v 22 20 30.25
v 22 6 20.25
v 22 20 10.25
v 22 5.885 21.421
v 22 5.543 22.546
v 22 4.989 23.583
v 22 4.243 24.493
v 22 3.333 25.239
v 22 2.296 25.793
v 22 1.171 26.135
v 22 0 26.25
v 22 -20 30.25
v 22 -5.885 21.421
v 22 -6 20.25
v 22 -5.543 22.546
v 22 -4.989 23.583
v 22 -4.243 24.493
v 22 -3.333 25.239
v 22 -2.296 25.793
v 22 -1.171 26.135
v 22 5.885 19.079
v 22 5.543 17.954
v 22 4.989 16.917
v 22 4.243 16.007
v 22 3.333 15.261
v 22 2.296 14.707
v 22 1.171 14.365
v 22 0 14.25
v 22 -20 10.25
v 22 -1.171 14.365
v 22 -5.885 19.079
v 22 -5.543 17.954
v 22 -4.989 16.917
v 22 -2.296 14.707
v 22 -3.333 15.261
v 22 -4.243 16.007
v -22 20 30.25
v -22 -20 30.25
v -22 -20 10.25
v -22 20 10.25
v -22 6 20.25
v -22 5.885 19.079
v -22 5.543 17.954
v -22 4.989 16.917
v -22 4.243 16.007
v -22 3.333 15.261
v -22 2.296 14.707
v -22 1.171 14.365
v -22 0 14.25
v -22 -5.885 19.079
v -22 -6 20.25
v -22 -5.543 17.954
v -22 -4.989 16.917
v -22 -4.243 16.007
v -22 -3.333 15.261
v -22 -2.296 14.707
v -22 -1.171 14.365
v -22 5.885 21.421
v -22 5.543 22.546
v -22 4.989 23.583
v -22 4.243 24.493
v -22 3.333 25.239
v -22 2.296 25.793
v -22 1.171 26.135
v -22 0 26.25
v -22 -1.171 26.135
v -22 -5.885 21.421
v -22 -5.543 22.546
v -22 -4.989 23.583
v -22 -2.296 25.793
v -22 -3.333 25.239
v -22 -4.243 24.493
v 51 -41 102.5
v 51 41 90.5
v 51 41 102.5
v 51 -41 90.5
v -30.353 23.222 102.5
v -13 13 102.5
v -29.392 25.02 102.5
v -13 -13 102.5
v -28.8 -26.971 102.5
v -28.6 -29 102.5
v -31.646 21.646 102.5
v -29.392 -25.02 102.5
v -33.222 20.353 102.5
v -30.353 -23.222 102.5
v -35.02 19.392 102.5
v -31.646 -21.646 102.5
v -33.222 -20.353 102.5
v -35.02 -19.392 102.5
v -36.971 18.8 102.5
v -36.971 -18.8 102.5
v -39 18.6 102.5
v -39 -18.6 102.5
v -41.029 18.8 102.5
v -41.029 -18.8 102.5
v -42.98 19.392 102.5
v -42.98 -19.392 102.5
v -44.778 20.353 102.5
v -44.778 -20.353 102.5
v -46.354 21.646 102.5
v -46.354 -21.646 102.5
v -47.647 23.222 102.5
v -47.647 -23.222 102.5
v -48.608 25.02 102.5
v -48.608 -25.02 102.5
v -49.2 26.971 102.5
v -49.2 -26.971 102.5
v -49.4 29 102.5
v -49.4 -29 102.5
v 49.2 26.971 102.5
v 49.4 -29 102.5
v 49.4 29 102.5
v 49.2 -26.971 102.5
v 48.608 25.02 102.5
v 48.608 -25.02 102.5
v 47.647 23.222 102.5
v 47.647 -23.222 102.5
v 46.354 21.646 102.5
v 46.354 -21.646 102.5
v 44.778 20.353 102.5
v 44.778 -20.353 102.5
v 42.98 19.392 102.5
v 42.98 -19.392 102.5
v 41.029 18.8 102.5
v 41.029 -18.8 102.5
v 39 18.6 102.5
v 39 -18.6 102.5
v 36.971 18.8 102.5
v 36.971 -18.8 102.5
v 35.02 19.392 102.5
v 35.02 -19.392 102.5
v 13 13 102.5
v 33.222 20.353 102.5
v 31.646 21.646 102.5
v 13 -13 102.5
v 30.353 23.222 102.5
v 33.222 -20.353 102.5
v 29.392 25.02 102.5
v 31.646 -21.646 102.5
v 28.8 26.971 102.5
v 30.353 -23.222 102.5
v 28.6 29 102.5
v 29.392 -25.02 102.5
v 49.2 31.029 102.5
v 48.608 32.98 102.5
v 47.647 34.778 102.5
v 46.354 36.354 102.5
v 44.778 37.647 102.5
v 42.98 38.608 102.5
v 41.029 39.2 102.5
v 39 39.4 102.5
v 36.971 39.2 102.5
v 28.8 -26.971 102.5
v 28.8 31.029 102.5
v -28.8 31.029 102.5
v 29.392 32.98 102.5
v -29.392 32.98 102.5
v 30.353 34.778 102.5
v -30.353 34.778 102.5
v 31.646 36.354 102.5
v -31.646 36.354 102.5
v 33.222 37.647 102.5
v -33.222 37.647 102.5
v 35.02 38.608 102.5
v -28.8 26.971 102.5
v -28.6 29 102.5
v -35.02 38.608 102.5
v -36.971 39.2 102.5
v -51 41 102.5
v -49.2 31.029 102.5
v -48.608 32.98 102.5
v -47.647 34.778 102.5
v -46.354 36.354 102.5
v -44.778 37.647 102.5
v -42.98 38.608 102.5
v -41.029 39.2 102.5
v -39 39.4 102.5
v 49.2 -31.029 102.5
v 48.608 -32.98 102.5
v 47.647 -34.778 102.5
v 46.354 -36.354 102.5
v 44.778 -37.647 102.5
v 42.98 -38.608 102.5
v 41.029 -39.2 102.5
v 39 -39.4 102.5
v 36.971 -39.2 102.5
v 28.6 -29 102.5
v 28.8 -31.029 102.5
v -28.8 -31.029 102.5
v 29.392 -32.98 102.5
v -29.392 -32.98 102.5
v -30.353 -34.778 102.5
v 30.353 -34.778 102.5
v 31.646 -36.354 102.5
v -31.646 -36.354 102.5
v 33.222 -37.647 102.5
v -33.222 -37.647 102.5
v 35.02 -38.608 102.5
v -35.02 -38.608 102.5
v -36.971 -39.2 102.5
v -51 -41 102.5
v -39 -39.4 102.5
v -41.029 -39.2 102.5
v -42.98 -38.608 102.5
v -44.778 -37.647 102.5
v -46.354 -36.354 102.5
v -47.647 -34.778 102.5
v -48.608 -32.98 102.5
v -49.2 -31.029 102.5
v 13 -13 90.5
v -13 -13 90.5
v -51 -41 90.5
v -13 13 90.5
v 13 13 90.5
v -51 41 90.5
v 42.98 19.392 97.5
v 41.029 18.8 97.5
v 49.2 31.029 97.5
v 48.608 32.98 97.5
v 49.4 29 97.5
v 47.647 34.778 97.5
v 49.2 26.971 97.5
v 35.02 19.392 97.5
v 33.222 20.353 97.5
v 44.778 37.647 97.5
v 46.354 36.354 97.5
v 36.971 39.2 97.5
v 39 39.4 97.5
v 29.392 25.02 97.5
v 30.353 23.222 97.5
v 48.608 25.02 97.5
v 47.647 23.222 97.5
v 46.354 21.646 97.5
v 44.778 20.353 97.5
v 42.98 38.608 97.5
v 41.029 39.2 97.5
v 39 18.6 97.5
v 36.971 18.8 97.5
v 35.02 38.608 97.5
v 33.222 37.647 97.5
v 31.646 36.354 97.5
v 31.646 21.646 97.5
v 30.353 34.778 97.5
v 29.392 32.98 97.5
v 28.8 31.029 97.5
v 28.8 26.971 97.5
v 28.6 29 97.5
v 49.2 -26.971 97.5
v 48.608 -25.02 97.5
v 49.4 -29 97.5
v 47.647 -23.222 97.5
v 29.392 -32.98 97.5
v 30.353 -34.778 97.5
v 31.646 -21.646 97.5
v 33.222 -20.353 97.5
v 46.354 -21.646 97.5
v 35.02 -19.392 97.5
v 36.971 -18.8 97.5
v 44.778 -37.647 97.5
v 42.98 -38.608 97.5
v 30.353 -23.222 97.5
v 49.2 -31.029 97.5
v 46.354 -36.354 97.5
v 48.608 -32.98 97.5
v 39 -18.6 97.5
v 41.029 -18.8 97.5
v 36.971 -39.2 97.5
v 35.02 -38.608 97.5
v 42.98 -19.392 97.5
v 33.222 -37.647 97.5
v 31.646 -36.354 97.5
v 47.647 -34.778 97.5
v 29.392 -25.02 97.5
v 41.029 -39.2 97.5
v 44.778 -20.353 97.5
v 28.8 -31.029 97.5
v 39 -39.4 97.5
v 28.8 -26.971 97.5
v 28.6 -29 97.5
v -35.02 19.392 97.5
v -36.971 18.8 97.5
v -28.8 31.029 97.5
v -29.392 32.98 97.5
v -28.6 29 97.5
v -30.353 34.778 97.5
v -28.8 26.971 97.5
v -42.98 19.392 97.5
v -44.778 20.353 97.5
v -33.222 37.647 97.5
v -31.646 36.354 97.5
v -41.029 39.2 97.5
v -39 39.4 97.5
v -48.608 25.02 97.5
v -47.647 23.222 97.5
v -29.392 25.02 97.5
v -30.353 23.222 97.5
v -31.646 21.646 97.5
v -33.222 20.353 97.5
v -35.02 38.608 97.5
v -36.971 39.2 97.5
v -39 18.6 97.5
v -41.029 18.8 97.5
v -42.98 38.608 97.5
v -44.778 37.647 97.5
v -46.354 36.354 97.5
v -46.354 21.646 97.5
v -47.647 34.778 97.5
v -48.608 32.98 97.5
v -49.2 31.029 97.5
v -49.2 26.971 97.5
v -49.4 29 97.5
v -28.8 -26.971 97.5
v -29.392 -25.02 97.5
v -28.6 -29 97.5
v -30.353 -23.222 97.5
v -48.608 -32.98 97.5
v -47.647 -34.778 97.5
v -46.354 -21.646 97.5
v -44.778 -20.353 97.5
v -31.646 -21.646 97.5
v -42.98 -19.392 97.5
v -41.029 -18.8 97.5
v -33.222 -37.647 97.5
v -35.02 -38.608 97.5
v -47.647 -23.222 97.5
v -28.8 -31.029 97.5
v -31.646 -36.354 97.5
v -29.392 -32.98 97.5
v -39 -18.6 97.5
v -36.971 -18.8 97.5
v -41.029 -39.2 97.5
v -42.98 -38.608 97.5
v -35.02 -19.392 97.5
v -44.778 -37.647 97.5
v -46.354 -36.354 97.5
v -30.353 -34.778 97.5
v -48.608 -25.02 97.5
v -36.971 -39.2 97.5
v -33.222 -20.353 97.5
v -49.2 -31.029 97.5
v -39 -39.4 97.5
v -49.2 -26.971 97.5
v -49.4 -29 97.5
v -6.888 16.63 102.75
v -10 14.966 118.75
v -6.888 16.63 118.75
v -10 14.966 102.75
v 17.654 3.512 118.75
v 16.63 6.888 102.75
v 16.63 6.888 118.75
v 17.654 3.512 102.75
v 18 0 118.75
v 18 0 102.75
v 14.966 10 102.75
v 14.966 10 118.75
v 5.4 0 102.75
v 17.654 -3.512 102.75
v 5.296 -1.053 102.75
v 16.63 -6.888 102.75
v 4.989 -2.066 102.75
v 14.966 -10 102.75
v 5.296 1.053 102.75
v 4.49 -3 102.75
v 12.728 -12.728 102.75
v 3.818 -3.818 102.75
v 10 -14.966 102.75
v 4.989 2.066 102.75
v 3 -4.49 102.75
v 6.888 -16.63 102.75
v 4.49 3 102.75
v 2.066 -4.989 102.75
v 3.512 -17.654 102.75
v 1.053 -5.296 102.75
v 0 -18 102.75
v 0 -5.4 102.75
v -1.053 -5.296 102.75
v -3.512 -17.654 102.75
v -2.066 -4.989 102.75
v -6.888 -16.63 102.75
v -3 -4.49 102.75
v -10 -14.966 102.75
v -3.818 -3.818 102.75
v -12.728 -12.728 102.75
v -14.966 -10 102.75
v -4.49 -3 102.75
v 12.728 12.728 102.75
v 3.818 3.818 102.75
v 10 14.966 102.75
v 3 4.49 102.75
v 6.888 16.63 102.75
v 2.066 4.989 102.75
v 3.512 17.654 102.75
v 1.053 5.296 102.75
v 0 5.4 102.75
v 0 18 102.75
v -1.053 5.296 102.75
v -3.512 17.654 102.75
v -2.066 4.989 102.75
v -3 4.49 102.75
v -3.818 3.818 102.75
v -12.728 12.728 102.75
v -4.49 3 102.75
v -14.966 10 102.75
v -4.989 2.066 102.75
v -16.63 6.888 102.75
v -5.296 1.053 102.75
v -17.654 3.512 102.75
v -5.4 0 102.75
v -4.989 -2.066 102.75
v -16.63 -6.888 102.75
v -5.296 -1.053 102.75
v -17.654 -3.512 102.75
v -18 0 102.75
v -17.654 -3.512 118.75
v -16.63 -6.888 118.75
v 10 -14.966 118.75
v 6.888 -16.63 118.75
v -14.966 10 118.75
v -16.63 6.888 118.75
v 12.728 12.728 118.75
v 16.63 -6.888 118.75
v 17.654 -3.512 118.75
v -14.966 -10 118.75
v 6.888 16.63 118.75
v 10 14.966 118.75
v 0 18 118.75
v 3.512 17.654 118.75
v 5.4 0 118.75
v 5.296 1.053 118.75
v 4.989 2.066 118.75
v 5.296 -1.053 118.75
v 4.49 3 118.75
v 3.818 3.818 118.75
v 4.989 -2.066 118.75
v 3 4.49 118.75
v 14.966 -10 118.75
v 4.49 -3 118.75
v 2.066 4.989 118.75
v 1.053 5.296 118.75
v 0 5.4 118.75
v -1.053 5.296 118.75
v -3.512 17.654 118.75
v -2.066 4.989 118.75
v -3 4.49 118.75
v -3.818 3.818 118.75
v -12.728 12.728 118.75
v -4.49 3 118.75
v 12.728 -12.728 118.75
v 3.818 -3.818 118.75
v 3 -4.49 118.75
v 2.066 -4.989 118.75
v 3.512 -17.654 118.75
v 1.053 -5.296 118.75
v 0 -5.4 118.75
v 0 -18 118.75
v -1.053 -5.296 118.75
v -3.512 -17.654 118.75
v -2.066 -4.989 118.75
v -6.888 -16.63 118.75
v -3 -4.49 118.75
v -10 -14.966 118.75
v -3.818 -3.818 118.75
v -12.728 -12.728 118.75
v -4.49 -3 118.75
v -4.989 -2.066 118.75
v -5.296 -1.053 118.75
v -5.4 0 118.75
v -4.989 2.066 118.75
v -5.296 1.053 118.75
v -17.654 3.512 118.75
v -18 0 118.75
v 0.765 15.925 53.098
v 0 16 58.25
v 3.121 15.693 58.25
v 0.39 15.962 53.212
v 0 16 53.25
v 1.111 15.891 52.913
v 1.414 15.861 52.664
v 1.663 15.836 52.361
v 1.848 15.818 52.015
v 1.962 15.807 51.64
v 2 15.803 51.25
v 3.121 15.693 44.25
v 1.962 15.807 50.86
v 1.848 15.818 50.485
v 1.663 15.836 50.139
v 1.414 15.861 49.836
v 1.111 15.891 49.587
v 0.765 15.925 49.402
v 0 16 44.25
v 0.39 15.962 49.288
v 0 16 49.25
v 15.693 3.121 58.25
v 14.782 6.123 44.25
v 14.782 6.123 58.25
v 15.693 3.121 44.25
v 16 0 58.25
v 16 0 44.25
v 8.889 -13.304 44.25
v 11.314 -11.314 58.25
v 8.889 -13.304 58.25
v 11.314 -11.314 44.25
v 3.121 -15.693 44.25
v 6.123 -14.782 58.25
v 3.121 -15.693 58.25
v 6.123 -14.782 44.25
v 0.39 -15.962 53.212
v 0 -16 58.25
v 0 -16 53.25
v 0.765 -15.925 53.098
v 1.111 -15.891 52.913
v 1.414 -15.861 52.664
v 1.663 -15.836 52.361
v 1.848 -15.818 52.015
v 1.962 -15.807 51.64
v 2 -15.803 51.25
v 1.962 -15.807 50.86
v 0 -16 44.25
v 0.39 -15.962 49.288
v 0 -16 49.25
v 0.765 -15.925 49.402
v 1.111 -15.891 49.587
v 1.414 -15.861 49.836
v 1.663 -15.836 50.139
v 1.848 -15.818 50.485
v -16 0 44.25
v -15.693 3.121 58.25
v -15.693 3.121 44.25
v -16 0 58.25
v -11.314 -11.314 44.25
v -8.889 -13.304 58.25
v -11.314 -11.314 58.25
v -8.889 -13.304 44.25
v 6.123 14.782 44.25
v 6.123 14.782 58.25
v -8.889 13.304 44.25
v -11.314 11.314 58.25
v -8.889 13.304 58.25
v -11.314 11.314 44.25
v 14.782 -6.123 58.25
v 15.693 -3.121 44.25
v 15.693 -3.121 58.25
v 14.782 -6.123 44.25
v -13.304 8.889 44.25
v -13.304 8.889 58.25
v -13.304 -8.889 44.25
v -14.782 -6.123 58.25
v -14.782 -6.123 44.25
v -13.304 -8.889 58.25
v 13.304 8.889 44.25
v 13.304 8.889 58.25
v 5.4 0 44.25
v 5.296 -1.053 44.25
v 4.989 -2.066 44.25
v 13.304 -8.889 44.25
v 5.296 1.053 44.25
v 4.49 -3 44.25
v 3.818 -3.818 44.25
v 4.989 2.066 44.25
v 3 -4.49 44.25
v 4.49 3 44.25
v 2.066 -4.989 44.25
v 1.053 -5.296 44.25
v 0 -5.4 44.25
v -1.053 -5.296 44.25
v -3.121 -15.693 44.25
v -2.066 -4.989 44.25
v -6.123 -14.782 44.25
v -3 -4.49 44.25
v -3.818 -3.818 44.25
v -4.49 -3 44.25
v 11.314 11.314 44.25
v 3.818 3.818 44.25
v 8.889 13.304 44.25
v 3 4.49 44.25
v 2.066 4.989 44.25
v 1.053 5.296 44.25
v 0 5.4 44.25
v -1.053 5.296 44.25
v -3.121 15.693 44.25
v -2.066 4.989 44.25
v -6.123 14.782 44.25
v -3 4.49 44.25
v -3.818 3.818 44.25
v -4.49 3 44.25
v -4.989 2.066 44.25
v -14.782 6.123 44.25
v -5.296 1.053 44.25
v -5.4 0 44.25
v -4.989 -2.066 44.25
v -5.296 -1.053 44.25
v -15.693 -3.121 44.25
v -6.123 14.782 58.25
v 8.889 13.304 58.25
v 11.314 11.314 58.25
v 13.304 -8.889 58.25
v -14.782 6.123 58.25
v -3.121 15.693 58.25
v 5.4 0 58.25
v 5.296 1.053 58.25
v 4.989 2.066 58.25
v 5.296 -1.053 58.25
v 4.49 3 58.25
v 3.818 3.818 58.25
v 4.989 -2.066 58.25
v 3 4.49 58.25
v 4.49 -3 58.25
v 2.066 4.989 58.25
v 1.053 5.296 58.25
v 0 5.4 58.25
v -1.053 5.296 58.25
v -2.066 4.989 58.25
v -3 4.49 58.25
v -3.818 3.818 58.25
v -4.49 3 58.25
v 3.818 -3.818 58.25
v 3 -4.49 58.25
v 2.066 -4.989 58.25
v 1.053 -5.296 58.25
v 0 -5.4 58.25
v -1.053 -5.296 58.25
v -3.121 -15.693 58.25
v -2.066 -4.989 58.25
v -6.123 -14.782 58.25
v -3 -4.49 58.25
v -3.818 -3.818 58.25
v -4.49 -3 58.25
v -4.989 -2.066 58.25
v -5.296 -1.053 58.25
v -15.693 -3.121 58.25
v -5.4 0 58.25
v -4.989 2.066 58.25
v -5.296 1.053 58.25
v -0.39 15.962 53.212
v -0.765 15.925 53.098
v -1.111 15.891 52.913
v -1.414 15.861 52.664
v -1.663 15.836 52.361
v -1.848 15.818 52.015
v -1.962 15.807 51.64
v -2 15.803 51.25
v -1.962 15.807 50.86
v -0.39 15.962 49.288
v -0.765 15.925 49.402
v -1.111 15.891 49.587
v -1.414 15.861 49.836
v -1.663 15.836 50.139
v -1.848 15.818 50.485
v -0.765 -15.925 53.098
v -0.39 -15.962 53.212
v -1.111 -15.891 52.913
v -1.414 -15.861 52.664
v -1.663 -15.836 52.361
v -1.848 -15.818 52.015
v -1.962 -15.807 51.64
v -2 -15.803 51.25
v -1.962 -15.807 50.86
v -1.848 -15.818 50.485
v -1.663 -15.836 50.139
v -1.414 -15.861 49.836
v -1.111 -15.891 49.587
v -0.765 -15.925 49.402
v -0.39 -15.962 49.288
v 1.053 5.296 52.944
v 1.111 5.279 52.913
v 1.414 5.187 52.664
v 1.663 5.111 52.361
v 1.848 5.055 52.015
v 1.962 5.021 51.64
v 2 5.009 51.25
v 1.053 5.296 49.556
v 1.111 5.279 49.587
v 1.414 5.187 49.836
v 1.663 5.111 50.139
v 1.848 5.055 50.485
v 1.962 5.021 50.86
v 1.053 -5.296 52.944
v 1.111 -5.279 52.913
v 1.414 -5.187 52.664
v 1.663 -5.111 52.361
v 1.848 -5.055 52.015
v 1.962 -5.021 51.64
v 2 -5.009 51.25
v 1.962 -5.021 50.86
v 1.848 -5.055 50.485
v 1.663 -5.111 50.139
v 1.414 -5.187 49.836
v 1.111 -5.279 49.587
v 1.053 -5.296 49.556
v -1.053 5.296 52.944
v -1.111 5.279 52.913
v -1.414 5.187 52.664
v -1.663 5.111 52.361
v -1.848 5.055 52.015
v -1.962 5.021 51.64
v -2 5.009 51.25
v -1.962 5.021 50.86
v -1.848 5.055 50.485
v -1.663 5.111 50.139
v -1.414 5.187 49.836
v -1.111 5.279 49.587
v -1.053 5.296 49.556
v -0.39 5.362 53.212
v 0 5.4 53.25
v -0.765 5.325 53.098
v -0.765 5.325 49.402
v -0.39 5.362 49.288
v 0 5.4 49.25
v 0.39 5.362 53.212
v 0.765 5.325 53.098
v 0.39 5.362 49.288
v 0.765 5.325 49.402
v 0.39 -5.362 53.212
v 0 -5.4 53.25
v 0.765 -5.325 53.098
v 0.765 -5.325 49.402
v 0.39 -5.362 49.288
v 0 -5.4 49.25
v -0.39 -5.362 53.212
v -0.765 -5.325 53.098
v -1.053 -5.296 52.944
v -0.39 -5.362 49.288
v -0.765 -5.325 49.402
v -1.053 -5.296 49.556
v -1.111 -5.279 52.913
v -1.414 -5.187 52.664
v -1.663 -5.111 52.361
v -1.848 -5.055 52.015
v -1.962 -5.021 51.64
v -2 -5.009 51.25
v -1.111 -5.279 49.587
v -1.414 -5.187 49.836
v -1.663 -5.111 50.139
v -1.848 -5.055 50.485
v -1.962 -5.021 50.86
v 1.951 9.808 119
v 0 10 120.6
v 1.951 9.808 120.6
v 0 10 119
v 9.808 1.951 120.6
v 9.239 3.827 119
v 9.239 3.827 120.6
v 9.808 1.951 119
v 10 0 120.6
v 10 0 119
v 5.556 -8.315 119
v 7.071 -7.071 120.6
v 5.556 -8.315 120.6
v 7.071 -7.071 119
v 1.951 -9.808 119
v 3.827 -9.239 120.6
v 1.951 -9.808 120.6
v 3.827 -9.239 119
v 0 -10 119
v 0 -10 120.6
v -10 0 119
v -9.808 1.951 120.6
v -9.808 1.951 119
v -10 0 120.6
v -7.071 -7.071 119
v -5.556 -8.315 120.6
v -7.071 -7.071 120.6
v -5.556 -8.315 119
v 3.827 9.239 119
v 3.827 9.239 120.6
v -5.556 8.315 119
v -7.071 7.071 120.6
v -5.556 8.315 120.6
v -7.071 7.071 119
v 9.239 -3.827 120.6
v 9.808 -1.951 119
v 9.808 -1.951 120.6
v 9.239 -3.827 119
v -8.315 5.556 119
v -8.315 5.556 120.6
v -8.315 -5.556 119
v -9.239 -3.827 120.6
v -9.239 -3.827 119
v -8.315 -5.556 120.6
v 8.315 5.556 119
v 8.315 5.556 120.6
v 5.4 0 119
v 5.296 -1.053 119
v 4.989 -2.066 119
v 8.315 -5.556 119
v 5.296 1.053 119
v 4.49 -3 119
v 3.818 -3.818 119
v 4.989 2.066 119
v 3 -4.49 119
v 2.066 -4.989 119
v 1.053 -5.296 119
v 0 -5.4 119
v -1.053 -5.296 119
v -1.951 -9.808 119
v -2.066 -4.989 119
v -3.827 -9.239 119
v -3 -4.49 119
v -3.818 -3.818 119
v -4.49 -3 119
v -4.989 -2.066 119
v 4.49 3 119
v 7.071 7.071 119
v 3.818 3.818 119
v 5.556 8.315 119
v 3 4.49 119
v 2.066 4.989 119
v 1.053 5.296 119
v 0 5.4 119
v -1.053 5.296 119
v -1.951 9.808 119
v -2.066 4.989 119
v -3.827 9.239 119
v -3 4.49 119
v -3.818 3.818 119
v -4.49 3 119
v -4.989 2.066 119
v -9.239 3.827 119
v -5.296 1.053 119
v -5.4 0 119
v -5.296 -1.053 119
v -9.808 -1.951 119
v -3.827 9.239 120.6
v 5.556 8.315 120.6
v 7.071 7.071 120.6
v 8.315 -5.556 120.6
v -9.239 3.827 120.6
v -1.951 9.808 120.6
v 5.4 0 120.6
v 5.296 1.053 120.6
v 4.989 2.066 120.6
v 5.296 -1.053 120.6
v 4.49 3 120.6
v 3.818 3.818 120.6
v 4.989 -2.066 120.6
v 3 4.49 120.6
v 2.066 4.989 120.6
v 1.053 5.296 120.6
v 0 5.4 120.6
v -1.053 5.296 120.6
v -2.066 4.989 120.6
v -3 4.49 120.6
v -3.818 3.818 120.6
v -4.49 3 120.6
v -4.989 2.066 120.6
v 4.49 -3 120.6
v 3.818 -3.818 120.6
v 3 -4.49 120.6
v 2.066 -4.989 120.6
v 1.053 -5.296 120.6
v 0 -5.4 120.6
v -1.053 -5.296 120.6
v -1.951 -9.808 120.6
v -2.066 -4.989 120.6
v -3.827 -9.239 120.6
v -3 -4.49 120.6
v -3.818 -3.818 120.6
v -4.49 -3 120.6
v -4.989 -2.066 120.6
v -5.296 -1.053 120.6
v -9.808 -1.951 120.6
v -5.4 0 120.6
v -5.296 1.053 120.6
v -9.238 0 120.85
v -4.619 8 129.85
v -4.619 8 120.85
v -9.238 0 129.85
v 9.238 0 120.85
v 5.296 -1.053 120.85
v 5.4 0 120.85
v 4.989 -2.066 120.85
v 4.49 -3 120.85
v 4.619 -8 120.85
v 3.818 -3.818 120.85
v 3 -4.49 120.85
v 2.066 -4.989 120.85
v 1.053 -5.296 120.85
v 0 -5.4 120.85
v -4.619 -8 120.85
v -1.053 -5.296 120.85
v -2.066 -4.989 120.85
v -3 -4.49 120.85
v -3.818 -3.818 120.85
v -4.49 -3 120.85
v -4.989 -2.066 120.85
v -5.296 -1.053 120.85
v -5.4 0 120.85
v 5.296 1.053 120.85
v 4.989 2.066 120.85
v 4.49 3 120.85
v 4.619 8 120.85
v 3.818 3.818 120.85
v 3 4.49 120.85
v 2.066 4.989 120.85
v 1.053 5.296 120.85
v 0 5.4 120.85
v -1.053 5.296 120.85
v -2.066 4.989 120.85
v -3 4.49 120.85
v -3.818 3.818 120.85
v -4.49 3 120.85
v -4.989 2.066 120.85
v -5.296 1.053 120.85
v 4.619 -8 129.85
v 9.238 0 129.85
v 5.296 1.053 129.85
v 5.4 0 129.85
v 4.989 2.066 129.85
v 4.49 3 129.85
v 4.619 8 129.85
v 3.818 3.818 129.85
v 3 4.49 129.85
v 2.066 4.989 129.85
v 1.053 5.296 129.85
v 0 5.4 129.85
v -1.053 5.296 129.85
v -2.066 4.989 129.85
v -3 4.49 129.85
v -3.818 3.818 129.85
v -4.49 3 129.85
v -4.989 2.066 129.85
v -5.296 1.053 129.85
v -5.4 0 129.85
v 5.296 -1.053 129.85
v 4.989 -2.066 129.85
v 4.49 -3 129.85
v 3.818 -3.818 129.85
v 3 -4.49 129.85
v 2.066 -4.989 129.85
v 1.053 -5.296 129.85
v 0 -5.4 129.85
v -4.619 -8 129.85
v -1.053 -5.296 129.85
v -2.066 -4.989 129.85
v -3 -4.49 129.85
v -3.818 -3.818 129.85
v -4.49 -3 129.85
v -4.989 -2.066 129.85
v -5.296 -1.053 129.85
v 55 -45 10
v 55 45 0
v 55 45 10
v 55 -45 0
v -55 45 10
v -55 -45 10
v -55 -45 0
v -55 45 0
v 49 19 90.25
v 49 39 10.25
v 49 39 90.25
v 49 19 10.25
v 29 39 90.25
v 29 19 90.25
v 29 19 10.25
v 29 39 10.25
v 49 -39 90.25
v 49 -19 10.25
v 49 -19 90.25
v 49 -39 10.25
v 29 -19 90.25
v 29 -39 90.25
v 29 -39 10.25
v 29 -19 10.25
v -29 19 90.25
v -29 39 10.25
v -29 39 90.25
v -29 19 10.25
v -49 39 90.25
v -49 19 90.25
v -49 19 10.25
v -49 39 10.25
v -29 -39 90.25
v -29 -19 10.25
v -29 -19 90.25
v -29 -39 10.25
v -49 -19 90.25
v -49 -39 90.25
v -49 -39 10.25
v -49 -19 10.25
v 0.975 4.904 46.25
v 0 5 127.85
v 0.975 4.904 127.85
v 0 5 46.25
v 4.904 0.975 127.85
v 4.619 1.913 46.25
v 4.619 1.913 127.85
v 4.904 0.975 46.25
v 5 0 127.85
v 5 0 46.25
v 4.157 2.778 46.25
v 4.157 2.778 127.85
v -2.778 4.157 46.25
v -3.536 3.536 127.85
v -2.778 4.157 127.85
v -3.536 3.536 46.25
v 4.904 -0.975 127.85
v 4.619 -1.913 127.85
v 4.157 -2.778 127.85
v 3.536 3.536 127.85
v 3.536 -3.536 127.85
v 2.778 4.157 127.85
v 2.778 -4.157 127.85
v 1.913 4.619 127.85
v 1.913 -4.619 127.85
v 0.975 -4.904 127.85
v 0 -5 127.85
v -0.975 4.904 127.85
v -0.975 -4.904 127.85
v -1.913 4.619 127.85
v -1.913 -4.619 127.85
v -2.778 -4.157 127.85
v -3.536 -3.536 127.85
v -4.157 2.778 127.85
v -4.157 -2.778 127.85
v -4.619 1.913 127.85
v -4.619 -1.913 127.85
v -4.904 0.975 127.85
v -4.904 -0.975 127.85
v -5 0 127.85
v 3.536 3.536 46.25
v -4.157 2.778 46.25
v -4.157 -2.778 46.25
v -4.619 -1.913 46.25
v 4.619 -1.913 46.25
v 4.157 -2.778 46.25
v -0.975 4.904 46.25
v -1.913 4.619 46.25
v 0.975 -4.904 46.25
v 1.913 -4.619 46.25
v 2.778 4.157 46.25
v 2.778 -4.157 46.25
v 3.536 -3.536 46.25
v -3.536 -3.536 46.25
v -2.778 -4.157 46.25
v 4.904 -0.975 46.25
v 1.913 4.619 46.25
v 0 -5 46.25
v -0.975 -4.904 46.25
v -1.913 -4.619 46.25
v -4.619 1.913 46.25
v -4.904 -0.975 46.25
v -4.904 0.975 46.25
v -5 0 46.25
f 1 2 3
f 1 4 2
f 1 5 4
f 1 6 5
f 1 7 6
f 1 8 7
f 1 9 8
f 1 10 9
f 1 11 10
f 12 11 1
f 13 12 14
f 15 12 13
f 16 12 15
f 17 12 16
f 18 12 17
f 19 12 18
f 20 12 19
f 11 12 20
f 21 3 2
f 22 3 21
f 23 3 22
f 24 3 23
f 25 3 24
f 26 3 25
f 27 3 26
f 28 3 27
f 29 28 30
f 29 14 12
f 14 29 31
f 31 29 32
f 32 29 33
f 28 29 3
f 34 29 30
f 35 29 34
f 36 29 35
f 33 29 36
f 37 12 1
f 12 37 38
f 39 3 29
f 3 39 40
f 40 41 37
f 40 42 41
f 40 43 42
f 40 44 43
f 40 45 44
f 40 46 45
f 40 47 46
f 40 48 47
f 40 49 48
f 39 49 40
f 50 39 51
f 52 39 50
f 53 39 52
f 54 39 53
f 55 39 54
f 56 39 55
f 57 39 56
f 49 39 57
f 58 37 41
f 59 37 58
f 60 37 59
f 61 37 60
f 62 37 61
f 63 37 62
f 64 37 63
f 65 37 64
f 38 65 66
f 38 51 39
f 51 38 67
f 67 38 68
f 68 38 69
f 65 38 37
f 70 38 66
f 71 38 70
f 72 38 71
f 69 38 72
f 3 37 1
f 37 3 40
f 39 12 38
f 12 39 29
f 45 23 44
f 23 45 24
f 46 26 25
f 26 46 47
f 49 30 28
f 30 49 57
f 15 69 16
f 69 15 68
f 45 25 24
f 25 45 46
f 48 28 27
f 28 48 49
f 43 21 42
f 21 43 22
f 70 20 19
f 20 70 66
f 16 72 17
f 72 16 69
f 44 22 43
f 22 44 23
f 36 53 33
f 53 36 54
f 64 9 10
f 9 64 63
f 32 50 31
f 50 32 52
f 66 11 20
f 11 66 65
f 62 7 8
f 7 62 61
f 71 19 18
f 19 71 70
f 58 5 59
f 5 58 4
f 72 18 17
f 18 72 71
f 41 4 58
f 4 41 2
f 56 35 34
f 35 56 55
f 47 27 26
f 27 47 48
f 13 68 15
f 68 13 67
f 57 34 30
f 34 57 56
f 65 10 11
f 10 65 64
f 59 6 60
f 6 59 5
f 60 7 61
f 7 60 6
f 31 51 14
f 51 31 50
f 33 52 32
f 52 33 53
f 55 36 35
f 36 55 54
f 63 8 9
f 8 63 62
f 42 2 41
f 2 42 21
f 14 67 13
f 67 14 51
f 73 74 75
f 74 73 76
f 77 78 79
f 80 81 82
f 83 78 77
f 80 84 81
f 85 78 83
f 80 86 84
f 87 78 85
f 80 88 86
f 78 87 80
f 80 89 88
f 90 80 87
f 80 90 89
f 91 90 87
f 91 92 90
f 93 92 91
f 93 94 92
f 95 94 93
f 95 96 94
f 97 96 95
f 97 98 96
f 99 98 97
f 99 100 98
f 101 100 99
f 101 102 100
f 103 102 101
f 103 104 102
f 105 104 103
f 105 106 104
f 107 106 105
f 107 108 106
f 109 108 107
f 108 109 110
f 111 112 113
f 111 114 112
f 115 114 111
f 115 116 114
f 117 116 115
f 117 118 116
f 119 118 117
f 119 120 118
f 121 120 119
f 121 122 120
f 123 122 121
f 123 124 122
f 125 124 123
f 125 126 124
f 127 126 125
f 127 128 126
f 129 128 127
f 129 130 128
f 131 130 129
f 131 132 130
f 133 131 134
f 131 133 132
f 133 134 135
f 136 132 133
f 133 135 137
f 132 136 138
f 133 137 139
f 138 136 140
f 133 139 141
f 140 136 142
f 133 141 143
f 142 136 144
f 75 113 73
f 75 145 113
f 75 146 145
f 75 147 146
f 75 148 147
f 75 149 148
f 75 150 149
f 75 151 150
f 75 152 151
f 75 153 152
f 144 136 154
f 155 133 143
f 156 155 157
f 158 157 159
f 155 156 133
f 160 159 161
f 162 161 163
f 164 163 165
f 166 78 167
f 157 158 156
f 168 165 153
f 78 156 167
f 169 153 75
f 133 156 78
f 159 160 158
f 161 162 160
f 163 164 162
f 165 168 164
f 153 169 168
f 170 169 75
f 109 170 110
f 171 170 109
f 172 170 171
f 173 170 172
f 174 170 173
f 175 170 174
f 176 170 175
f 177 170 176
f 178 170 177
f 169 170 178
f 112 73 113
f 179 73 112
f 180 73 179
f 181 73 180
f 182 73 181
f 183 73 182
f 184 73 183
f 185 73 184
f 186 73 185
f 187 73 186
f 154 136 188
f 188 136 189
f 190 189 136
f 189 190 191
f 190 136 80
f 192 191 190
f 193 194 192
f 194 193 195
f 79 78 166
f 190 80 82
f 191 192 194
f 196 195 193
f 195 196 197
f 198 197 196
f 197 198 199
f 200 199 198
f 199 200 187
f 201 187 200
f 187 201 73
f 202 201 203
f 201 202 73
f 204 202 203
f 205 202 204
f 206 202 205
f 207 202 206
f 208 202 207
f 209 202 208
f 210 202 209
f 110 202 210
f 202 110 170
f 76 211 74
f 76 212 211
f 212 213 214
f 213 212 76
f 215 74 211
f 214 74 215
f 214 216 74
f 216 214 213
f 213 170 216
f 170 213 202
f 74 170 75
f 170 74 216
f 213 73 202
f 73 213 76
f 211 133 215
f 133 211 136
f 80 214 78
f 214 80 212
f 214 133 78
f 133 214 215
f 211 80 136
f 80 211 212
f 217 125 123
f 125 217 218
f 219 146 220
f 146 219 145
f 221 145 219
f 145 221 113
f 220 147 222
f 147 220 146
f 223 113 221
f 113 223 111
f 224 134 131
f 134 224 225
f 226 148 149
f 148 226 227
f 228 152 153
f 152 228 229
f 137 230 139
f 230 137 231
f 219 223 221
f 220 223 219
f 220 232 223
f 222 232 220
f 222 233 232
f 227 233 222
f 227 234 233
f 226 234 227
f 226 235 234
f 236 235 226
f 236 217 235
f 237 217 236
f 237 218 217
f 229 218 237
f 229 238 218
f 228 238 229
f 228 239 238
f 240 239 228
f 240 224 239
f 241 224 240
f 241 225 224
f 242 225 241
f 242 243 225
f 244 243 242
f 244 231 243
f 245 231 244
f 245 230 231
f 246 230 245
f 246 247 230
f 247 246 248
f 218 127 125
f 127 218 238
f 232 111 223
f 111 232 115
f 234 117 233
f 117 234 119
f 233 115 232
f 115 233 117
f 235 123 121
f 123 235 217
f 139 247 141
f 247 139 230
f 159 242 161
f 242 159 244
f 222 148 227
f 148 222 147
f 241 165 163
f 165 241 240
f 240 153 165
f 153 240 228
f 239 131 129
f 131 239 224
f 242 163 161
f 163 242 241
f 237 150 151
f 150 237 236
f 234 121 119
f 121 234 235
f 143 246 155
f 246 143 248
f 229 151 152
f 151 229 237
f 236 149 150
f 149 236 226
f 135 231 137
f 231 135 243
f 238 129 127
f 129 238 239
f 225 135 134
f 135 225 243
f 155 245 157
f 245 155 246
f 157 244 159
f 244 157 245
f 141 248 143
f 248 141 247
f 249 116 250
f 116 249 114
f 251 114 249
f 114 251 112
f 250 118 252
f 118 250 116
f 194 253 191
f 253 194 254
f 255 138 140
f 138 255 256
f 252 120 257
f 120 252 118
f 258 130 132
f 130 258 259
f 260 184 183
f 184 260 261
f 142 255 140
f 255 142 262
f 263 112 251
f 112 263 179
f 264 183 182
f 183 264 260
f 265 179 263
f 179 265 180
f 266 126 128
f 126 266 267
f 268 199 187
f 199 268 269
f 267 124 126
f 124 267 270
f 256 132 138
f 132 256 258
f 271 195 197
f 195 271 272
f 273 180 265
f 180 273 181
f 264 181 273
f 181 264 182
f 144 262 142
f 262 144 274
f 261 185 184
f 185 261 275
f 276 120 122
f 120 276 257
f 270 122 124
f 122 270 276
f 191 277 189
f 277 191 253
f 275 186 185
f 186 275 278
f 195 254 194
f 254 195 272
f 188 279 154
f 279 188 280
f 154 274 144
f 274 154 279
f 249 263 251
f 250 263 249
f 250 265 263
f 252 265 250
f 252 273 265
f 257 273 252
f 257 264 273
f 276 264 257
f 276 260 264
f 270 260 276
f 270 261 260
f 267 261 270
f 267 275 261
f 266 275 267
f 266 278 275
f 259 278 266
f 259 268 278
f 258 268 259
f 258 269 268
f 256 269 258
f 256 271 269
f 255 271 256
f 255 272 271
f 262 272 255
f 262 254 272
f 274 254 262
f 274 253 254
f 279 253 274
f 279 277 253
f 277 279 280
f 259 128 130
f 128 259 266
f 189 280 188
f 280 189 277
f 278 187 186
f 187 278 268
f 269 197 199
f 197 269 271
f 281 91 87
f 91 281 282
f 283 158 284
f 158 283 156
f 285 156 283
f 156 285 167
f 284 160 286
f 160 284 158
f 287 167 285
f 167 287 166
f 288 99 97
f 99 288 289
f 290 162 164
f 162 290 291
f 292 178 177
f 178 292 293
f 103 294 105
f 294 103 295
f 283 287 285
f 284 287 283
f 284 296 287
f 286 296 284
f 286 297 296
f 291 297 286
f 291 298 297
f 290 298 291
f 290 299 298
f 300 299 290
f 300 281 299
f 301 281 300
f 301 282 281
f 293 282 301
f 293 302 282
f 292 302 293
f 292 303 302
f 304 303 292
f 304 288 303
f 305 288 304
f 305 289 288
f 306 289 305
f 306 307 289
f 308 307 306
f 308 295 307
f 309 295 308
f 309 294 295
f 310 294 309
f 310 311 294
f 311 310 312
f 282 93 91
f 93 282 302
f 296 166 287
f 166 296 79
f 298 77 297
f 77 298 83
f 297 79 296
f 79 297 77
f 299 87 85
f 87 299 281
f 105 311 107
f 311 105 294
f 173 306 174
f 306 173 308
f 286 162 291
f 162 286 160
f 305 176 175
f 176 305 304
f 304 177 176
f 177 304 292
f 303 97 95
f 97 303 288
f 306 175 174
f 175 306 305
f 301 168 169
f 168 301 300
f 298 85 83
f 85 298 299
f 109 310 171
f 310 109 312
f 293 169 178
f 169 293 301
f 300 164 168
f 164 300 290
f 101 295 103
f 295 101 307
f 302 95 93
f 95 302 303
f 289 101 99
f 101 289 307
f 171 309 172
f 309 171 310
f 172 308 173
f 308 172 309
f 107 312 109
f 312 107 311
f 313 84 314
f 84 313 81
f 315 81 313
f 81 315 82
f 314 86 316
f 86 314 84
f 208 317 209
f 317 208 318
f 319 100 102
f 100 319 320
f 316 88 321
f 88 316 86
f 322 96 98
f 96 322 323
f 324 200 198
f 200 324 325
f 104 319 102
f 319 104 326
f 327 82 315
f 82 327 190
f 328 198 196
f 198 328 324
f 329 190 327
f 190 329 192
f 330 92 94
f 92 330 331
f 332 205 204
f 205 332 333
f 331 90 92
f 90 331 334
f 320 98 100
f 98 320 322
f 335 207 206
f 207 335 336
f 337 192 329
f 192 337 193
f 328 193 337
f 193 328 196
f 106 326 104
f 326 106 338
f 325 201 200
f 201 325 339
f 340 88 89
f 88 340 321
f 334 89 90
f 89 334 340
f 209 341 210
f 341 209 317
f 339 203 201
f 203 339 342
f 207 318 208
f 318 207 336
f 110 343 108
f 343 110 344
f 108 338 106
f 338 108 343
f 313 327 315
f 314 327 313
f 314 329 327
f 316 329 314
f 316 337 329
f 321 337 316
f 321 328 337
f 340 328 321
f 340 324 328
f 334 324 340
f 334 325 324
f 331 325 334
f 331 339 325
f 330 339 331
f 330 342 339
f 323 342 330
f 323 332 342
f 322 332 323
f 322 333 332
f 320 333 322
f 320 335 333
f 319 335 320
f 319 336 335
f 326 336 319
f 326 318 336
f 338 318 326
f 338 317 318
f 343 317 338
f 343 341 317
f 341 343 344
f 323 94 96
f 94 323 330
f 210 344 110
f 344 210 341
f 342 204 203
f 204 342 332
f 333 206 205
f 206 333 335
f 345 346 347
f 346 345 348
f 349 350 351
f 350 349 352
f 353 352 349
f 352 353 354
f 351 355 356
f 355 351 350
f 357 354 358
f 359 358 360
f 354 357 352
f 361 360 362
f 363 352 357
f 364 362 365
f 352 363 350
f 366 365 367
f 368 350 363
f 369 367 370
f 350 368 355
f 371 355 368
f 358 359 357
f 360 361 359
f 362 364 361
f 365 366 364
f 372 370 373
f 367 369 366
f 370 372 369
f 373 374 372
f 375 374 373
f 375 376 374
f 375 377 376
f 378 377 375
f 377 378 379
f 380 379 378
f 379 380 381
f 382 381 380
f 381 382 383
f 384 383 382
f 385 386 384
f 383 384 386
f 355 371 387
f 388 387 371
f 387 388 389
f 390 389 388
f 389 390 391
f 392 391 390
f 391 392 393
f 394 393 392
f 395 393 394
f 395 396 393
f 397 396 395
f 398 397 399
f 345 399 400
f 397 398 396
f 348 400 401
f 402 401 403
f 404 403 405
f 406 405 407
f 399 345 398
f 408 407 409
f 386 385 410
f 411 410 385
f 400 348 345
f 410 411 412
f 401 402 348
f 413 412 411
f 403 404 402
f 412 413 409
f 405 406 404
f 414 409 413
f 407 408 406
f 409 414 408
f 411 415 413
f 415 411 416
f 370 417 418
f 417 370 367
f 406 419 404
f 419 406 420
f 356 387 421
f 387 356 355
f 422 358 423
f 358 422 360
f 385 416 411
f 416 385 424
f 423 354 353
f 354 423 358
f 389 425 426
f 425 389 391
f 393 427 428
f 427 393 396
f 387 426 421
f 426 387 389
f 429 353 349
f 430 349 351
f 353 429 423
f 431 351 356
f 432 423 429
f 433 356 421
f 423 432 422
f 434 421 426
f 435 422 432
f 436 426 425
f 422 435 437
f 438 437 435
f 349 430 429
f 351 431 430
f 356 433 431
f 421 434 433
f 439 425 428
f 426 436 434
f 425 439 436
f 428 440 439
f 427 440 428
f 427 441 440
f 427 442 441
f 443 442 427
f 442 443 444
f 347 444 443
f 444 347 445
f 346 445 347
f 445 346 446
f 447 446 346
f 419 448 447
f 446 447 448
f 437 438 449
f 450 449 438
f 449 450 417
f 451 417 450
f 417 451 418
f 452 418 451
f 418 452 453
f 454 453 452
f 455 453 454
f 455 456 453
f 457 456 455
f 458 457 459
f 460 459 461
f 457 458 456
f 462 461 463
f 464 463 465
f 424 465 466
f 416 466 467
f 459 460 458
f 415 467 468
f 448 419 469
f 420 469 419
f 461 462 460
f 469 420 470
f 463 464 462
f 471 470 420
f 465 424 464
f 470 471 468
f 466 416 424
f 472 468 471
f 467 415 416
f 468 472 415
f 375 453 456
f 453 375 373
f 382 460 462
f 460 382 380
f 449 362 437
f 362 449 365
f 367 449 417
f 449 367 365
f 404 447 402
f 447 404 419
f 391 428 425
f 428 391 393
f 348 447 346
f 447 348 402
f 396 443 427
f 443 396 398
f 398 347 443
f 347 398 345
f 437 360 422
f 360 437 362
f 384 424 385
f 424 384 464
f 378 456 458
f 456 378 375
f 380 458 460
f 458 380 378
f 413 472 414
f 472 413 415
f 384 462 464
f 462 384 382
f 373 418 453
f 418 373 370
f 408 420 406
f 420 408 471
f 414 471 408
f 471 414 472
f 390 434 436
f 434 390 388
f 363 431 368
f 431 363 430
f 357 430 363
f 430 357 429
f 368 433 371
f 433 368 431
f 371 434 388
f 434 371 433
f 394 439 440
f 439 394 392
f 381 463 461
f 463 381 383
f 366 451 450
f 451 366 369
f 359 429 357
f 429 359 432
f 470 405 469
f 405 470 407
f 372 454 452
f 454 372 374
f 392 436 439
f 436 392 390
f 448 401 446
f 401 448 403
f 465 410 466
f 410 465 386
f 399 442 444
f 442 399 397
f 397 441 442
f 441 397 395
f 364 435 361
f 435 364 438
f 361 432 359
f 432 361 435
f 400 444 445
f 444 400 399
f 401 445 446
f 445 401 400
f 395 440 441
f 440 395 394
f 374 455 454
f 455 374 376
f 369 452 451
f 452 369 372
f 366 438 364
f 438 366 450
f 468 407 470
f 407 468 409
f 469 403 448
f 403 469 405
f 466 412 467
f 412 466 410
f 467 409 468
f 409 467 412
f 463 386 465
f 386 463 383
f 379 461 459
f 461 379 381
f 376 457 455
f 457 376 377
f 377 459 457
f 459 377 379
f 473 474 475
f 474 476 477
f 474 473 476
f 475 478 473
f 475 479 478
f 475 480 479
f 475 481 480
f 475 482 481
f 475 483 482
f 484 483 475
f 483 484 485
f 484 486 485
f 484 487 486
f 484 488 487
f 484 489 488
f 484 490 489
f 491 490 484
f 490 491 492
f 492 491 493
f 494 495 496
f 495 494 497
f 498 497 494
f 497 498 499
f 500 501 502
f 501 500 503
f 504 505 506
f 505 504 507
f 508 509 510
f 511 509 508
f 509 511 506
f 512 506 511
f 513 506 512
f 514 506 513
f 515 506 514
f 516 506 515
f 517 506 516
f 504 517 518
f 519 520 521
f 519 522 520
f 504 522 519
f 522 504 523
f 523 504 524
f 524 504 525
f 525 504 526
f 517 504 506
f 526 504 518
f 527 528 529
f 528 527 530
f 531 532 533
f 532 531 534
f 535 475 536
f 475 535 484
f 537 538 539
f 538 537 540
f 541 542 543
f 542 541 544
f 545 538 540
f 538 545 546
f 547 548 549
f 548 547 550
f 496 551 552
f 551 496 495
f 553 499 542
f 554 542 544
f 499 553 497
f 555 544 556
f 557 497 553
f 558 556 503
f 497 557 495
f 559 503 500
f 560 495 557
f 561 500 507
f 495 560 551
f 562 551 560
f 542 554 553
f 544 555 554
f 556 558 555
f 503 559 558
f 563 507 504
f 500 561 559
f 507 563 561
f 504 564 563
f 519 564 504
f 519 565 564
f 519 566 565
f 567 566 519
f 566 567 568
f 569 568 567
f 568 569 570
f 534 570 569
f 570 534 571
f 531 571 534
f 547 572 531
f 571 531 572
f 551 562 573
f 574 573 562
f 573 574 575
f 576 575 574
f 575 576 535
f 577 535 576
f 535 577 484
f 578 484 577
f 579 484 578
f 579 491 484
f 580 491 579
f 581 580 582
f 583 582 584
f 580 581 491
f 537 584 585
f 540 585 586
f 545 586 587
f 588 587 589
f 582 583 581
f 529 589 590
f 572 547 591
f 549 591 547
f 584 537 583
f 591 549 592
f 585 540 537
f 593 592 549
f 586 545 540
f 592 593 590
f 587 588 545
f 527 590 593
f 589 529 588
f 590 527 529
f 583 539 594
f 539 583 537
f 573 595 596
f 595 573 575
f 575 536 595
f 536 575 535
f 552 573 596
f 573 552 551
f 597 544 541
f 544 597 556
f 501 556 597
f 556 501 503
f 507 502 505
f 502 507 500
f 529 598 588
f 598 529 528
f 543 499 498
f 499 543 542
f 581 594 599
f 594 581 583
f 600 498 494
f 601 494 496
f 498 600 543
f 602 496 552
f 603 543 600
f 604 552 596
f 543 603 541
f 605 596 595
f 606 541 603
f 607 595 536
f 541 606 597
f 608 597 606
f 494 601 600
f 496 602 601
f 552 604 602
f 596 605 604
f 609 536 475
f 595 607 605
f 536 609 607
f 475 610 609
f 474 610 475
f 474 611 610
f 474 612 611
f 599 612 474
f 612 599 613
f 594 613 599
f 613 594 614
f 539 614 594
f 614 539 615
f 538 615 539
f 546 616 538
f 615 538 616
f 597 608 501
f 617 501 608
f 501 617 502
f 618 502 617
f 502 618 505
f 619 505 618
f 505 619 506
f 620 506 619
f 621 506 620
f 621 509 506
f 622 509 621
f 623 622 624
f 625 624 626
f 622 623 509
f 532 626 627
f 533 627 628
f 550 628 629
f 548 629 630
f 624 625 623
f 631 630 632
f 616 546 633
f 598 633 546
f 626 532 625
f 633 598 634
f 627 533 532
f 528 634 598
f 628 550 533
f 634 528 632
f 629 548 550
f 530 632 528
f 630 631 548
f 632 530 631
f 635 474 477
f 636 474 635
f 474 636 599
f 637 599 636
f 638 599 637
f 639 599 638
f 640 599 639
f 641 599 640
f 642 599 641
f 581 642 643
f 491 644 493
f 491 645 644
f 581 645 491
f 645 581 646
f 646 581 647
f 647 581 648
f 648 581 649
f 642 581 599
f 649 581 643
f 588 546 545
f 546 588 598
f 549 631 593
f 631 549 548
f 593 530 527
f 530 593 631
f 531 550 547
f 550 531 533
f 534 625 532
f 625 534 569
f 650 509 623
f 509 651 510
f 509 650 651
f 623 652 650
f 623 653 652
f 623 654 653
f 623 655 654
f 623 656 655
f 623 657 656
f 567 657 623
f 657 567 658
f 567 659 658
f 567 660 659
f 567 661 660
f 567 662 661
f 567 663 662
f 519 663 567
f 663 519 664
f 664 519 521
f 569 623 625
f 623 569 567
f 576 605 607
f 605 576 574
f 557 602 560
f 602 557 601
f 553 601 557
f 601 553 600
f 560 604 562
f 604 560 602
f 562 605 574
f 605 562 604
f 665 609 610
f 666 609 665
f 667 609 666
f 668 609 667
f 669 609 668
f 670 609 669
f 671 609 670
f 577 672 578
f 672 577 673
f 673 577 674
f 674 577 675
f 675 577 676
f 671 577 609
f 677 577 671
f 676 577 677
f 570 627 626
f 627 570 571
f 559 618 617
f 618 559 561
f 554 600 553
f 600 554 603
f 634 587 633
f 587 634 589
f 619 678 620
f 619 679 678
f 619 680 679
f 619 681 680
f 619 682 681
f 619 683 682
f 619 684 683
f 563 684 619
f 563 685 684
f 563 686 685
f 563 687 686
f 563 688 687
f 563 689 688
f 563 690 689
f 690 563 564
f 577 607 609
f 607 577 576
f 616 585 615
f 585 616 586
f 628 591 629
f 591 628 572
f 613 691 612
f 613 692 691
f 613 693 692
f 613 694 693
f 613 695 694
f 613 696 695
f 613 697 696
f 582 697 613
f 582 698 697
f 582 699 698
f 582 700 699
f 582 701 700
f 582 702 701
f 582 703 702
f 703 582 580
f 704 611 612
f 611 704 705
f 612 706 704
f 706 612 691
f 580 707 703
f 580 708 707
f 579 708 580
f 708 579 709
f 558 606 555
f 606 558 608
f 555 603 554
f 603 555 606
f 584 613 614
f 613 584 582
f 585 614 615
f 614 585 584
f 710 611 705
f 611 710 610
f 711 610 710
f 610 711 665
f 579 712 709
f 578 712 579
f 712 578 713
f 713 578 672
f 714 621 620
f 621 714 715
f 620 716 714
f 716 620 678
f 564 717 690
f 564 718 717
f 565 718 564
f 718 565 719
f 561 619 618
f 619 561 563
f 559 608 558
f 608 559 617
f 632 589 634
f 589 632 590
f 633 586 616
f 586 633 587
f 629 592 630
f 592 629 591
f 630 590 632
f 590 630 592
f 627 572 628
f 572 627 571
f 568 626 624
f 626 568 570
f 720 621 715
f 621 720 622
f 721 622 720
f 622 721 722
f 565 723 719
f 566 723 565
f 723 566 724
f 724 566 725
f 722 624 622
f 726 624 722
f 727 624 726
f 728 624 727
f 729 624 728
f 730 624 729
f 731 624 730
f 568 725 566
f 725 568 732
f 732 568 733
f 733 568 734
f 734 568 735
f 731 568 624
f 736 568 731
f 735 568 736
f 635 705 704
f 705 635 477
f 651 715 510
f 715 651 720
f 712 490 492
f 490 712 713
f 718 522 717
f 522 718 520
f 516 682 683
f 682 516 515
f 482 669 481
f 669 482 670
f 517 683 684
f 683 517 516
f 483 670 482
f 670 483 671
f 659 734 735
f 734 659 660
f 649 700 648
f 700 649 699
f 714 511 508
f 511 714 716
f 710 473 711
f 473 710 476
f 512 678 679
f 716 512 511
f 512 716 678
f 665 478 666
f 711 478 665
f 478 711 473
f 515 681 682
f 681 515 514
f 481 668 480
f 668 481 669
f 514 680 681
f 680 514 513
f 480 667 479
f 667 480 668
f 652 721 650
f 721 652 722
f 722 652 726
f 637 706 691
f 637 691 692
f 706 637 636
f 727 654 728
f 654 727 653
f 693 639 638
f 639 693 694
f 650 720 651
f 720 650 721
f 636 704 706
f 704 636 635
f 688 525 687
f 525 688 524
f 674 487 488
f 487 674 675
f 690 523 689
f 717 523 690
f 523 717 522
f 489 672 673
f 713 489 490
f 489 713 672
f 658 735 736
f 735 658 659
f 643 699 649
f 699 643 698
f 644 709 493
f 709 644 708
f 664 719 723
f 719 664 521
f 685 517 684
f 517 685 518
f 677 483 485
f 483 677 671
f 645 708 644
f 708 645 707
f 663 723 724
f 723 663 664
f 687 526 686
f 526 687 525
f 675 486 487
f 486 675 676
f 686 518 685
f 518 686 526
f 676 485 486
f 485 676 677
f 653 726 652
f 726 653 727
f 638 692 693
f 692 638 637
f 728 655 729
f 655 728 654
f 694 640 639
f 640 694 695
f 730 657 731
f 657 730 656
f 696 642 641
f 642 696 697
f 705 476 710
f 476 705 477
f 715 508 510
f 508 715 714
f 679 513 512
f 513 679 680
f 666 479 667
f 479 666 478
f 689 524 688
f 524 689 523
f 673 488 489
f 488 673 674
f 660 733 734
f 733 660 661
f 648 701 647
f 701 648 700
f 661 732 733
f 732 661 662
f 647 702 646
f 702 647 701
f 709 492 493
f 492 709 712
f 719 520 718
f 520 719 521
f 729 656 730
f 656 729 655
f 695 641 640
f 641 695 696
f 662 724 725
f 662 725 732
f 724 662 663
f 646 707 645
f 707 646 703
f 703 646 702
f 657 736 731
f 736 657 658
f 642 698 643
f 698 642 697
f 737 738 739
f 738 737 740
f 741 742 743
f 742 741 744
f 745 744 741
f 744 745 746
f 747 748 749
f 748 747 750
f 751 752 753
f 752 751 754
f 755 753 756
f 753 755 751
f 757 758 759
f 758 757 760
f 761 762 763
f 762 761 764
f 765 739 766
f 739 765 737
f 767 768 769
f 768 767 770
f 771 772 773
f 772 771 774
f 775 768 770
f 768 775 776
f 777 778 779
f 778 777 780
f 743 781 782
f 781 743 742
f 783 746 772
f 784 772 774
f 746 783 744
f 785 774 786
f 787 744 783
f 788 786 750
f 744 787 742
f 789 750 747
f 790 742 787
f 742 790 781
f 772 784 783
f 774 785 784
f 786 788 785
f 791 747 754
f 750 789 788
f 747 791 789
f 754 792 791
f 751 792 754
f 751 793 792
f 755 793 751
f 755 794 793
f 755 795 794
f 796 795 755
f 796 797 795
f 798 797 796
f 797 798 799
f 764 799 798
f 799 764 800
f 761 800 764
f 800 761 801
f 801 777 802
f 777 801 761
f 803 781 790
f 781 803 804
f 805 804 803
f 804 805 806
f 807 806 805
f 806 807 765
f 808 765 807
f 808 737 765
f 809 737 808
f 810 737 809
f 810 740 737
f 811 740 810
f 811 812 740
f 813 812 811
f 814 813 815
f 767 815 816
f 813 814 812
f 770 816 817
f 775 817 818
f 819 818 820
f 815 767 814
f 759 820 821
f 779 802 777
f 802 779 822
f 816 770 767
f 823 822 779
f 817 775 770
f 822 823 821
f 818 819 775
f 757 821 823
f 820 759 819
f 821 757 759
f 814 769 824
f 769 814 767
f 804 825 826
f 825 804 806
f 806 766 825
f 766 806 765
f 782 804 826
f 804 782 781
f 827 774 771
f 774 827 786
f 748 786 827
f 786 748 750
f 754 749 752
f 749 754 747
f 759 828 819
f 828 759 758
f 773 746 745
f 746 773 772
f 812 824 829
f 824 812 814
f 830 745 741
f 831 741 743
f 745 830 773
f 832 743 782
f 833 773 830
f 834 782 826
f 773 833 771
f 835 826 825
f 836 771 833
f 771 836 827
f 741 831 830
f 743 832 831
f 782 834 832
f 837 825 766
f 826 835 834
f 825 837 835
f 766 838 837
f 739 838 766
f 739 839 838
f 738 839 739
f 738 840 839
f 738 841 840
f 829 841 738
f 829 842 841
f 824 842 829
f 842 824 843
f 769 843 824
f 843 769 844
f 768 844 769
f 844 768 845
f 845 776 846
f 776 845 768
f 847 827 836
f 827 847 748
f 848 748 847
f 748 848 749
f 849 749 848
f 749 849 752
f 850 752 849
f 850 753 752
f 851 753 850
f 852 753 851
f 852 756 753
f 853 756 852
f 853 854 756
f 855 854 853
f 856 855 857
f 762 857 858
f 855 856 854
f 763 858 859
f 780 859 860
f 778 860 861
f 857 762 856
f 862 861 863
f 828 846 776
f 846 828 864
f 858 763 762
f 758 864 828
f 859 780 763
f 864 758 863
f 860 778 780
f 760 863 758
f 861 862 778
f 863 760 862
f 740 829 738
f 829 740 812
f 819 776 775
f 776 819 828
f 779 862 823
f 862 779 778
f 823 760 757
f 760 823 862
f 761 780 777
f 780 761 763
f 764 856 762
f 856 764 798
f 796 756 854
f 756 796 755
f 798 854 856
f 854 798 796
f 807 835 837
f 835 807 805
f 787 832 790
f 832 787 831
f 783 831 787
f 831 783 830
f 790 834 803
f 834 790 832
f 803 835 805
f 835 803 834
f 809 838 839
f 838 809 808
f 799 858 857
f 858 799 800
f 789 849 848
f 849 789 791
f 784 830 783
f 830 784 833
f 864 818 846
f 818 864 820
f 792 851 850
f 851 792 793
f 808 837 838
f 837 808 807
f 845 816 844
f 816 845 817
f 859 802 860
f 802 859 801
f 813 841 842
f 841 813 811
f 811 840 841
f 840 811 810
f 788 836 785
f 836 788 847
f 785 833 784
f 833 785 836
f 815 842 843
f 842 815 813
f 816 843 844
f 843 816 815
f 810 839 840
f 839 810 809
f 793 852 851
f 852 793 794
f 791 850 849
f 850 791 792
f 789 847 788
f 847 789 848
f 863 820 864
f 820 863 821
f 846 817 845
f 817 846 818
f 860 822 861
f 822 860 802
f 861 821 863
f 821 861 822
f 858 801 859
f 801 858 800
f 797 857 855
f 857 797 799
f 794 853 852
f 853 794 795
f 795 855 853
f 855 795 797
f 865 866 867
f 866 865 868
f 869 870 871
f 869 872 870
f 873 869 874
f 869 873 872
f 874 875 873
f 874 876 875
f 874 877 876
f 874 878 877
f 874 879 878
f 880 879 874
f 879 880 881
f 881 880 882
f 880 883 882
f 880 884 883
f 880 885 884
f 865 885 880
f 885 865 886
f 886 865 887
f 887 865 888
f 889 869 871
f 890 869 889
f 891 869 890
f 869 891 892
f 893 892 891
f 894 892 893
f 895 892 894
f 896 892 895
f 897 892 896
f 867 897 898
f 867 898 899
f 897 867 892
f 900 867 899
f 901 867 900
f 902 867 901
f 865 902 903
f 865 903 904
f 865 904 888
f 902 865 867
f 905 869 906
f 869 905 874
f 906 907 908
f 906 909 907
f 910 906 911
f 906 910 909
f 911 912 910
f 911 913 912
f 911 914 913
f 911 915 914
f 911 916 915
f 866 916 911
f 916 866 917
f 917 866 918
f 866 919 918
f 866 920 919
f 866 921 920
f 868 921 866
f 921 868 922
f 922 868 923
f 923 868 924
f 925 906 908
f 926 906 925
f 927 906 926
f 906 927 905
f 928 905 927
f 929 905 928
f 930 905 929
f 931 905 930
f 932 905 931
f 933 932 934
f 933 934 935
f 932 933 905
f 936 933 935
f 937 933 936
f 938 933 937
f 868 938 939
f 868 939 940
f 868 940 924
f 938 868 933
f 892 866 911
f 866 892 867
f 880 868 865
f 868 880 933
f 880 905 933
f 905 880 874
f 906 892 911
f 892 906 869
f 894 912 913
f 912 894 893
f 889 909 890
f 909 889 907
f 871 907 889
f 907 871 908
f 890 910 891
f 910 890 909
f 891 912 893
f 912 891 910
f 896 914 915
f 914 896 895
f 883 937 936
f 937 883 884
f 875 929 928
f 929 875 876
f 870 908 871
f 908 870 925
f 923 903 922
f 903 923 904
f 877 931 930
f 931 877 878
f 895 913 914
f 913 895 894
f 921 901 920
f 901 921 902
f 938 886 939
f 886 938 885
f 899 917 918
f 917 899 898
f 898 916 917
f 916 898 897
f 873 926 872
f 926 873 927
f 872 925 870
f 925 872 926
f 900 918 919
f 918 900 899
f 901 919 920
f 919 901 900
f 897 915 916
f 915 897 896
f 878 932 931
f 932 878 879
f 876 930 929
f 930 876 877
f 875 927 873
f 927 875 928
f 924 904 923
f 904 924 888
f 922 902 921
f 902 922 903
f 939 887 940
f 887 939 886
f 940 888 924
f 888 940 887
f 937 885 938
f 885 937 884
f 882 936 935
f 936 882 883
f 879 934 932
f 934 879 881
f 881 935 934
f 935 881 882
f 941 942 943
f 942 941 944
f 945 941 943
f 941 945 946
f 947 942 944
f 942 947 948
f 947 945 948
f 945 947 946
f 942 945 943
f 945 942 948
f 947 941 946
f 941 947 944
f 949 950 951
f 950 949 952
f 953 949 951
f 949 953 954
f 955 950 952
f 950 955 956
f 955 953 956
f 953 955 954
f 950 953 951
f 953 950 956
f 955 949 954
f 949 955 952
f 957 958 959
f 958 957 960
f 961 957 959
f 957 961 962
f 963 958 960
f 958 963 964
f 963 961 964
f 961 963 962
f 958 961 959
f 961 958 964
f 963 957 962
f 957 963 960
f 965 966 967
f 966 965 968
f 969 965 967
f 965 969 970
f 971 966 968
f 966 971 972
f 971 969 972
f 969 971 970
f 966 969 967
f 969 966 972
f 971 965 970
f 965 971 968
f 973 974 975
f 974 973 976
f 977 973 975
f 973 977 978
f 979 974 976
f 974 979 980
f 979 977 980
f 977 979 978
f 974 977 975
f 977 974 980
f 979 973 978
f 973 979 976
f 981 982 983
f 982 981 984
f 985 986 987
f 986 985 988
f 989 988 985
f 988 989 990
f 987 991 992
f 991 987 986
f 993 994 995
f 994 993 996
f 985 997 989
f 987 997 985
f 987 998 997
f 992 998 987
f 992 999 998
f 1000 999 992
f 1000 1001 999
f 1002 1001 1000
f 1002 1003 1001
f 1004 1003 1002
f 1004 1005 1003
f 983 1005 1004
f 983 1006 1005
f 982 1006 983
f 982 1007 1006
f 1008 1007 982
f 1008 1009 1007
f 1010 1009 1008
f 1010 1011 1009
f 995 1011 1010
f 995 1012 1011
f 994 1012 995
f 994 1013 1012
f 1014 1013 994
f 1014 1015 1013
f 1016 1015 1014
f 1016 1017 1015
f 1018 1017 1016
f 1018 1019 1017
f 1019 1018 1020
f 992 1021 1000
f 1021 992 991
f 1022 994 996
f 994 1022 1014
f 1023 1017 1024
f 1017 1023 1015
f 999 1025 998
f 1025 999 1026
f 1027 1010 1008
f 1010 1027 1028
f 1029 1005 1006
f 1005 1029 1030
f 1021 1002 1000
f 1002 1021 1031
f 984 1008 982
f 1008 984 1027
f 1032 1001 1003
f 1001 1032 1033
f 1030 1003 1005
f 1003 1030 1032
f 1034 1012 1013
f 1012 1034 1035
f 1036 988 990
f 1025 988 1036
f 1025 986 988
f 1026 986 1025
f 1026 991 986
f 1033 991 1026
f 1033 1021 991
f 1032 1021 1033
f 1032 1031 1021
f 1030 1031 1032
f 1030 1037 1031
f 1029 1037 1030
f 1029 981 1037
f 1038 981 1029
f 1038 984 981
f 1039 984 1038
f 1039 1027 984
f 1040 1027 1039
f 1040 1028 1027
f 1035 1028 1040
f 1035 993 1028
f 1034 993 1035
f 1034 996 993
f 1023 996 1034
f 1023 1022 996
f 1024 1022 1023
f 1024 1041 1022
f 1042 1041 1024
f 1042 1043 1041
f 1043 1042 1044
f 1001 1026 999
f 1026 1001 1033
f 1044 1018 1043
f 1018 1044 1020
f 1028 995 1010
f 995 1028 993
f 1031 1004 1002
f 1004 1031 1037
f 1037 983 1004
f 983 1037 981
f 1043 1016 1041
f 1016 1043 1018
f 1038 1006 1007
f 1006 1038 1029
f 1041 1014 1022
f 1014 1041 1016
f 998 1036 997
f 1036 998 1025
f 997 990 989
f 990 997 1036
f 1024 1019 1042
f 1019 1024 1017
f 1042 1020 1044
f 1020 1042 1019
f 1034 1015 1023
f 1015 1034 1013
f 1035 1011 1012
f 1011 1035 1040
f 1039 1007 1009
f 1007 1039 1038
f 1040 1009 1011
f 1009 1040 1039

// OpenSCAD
$fn = 32;

// ------------------------------------------------------------------------
// Arbor press fixture: screw d10, posts 80 mm, gap 14 mm
// Every part is its own module, assembly() places every instance.
// ------------------------------------------------------------------------

// --- part 1 ---
module press_bed() {
  difference() {
    translate([-55, -45, 0]) cube([110, 90, 10]);
  }
}

// --- part 2 ---
module anvil_block() {
  difference() {
    translate([-22, -20, 0]) cube([44, 40, 20]);
    translate([0, 0, 10]) rotate([0, 90, 0]) cylinder(h = 46, d = 12, center = true);
  }
}

// --- part 3 ---
module press_post_a() {
  translate([-10, -10, 0]) cube([20, 20, 80]);
}

// --- part 4 ---
module press_post_b() {
  translate([-10, -10, 0]) cube([20, 20, 80]);
}

// --- part 5 ---
module press_post_c() {
  translate([-10, -10, 0]) cube([20, 20, 80]);
}

// --- part 6 ---
module press_post_d() {
  translate([-10, -10, 0]) cube([20, 20, 80]);
}

// --- part 7 ---
module press_frame() {
  difference() {
    translate([-51, -41, 0]) cube([102, 82, 12]);
    translate([-13, -13, -1]) cube([26, 26, 14]);
    translate([39, 29, 7]) cylinder(h = 6, d = 20.8);
    translate([39, -29, 7]) cylinder(h = 6, d = 20.8);
    translate([-39, 29, 7]) cylinder(h = 6, d = 20.8);
    translate([-39, -29, 7]) cylinder(h = 6, d = 20.8);
  }
}

// --- part 8 ---
module guide_ring() {
  difference() {
      translate([0, 0, 0]) cylinder(h = 16, d = 36);
      translate([0, 0, -1]) cylinder(h = 18, d = 10.8);
    }
}

// --- part 9 ---
module press_screw() {
  translate([0, 0, -40.8]) cylinder(h = 81.6, d = 10);
}

// --- part 10 ---
module press_head() {
  difference() {
    cylinder(h = 14, d = 32);
    translate([0, 0, -1]) cylinder(h = 16, d = 10.8);
    translate([0, 0, 7]) rotate([90, 0, 0]) cylinder(h = 34, d = 4, center = true);
  }
}

// --- part 11 ---
module nut_washer() {
  difference() {
      translate([0, 0, 0]) cylinder(h = 1.6, d = 20);
      translate([0, 0, -1]) cylinder(h = 3.6, d = 10.8);
    }
}

// --- part 12 ---
module press_nut() {
  difference() {
    linear_extrude(height = 9) polygon(points = [[9.238, 0], [4.619, 8], [-4.619, 8], [-9.238, 0], [-4.619, -8], [4.619, -8]]);
    translate([0, 0, -1]) cylinder(h = 11, d = 10.8);
  }
}

// --- assembly ---
module assembly() {
  color([0.80, 0.24, 0.20]) translate([0, 0, 0]) rotate([0, 0, 0]) press_bed();
  color([0.20, 0.45, 0.75]) translate([0, 0, 10.25]) rotate([0, 0, 0]) anvil_block();
  color([0.25, 0.62, 0.32]) translate([39, 29, 10.25]) rotate([0, 0, 0]) press_post_a();
  color([0.92, 0.70, 0.18]) translate([39, -29, 10.25]) rotate([0, 0, 0]) press_post_b();
  color([0.58, 0.35, 0.70]) translate([-39, 29, 10.25]) rotate([0, 0, 0]) press_post_c();
  color([0.16, 0.66, 0.66]) translate([-39, -29, 10.25]) rotate([0, 0, 0]) press_post_d();
  color([0.85, 0.48, 0.18]) translate([0, 0, 90.5]) rotate([0, 0, 0]) press_frame();
  color([0.55, 0.60, 0.65]) translate([0, 0, 102.75]) rotate([0, 0, 0]) guide_ring();
  color([0.75, 0.30, 0.55]) translate([0, 0, 87.05]) rotate([0, 0, 0]) press_screw();
  color([0.42, 0.52, 0.28]) translate([0, 0, 44.25]) rotate([0, 0, 0]) press_head();
  color([0.80, 0.24, 0.20]) translate([0, 0, 119]) rotate([0, 0, 0]) nut_washer();
  color([0.20, 0.45, 0.75]) translate([0, 0, 120.85]) rotate([0, 0, 0]) press_nut();
}

assembly();
